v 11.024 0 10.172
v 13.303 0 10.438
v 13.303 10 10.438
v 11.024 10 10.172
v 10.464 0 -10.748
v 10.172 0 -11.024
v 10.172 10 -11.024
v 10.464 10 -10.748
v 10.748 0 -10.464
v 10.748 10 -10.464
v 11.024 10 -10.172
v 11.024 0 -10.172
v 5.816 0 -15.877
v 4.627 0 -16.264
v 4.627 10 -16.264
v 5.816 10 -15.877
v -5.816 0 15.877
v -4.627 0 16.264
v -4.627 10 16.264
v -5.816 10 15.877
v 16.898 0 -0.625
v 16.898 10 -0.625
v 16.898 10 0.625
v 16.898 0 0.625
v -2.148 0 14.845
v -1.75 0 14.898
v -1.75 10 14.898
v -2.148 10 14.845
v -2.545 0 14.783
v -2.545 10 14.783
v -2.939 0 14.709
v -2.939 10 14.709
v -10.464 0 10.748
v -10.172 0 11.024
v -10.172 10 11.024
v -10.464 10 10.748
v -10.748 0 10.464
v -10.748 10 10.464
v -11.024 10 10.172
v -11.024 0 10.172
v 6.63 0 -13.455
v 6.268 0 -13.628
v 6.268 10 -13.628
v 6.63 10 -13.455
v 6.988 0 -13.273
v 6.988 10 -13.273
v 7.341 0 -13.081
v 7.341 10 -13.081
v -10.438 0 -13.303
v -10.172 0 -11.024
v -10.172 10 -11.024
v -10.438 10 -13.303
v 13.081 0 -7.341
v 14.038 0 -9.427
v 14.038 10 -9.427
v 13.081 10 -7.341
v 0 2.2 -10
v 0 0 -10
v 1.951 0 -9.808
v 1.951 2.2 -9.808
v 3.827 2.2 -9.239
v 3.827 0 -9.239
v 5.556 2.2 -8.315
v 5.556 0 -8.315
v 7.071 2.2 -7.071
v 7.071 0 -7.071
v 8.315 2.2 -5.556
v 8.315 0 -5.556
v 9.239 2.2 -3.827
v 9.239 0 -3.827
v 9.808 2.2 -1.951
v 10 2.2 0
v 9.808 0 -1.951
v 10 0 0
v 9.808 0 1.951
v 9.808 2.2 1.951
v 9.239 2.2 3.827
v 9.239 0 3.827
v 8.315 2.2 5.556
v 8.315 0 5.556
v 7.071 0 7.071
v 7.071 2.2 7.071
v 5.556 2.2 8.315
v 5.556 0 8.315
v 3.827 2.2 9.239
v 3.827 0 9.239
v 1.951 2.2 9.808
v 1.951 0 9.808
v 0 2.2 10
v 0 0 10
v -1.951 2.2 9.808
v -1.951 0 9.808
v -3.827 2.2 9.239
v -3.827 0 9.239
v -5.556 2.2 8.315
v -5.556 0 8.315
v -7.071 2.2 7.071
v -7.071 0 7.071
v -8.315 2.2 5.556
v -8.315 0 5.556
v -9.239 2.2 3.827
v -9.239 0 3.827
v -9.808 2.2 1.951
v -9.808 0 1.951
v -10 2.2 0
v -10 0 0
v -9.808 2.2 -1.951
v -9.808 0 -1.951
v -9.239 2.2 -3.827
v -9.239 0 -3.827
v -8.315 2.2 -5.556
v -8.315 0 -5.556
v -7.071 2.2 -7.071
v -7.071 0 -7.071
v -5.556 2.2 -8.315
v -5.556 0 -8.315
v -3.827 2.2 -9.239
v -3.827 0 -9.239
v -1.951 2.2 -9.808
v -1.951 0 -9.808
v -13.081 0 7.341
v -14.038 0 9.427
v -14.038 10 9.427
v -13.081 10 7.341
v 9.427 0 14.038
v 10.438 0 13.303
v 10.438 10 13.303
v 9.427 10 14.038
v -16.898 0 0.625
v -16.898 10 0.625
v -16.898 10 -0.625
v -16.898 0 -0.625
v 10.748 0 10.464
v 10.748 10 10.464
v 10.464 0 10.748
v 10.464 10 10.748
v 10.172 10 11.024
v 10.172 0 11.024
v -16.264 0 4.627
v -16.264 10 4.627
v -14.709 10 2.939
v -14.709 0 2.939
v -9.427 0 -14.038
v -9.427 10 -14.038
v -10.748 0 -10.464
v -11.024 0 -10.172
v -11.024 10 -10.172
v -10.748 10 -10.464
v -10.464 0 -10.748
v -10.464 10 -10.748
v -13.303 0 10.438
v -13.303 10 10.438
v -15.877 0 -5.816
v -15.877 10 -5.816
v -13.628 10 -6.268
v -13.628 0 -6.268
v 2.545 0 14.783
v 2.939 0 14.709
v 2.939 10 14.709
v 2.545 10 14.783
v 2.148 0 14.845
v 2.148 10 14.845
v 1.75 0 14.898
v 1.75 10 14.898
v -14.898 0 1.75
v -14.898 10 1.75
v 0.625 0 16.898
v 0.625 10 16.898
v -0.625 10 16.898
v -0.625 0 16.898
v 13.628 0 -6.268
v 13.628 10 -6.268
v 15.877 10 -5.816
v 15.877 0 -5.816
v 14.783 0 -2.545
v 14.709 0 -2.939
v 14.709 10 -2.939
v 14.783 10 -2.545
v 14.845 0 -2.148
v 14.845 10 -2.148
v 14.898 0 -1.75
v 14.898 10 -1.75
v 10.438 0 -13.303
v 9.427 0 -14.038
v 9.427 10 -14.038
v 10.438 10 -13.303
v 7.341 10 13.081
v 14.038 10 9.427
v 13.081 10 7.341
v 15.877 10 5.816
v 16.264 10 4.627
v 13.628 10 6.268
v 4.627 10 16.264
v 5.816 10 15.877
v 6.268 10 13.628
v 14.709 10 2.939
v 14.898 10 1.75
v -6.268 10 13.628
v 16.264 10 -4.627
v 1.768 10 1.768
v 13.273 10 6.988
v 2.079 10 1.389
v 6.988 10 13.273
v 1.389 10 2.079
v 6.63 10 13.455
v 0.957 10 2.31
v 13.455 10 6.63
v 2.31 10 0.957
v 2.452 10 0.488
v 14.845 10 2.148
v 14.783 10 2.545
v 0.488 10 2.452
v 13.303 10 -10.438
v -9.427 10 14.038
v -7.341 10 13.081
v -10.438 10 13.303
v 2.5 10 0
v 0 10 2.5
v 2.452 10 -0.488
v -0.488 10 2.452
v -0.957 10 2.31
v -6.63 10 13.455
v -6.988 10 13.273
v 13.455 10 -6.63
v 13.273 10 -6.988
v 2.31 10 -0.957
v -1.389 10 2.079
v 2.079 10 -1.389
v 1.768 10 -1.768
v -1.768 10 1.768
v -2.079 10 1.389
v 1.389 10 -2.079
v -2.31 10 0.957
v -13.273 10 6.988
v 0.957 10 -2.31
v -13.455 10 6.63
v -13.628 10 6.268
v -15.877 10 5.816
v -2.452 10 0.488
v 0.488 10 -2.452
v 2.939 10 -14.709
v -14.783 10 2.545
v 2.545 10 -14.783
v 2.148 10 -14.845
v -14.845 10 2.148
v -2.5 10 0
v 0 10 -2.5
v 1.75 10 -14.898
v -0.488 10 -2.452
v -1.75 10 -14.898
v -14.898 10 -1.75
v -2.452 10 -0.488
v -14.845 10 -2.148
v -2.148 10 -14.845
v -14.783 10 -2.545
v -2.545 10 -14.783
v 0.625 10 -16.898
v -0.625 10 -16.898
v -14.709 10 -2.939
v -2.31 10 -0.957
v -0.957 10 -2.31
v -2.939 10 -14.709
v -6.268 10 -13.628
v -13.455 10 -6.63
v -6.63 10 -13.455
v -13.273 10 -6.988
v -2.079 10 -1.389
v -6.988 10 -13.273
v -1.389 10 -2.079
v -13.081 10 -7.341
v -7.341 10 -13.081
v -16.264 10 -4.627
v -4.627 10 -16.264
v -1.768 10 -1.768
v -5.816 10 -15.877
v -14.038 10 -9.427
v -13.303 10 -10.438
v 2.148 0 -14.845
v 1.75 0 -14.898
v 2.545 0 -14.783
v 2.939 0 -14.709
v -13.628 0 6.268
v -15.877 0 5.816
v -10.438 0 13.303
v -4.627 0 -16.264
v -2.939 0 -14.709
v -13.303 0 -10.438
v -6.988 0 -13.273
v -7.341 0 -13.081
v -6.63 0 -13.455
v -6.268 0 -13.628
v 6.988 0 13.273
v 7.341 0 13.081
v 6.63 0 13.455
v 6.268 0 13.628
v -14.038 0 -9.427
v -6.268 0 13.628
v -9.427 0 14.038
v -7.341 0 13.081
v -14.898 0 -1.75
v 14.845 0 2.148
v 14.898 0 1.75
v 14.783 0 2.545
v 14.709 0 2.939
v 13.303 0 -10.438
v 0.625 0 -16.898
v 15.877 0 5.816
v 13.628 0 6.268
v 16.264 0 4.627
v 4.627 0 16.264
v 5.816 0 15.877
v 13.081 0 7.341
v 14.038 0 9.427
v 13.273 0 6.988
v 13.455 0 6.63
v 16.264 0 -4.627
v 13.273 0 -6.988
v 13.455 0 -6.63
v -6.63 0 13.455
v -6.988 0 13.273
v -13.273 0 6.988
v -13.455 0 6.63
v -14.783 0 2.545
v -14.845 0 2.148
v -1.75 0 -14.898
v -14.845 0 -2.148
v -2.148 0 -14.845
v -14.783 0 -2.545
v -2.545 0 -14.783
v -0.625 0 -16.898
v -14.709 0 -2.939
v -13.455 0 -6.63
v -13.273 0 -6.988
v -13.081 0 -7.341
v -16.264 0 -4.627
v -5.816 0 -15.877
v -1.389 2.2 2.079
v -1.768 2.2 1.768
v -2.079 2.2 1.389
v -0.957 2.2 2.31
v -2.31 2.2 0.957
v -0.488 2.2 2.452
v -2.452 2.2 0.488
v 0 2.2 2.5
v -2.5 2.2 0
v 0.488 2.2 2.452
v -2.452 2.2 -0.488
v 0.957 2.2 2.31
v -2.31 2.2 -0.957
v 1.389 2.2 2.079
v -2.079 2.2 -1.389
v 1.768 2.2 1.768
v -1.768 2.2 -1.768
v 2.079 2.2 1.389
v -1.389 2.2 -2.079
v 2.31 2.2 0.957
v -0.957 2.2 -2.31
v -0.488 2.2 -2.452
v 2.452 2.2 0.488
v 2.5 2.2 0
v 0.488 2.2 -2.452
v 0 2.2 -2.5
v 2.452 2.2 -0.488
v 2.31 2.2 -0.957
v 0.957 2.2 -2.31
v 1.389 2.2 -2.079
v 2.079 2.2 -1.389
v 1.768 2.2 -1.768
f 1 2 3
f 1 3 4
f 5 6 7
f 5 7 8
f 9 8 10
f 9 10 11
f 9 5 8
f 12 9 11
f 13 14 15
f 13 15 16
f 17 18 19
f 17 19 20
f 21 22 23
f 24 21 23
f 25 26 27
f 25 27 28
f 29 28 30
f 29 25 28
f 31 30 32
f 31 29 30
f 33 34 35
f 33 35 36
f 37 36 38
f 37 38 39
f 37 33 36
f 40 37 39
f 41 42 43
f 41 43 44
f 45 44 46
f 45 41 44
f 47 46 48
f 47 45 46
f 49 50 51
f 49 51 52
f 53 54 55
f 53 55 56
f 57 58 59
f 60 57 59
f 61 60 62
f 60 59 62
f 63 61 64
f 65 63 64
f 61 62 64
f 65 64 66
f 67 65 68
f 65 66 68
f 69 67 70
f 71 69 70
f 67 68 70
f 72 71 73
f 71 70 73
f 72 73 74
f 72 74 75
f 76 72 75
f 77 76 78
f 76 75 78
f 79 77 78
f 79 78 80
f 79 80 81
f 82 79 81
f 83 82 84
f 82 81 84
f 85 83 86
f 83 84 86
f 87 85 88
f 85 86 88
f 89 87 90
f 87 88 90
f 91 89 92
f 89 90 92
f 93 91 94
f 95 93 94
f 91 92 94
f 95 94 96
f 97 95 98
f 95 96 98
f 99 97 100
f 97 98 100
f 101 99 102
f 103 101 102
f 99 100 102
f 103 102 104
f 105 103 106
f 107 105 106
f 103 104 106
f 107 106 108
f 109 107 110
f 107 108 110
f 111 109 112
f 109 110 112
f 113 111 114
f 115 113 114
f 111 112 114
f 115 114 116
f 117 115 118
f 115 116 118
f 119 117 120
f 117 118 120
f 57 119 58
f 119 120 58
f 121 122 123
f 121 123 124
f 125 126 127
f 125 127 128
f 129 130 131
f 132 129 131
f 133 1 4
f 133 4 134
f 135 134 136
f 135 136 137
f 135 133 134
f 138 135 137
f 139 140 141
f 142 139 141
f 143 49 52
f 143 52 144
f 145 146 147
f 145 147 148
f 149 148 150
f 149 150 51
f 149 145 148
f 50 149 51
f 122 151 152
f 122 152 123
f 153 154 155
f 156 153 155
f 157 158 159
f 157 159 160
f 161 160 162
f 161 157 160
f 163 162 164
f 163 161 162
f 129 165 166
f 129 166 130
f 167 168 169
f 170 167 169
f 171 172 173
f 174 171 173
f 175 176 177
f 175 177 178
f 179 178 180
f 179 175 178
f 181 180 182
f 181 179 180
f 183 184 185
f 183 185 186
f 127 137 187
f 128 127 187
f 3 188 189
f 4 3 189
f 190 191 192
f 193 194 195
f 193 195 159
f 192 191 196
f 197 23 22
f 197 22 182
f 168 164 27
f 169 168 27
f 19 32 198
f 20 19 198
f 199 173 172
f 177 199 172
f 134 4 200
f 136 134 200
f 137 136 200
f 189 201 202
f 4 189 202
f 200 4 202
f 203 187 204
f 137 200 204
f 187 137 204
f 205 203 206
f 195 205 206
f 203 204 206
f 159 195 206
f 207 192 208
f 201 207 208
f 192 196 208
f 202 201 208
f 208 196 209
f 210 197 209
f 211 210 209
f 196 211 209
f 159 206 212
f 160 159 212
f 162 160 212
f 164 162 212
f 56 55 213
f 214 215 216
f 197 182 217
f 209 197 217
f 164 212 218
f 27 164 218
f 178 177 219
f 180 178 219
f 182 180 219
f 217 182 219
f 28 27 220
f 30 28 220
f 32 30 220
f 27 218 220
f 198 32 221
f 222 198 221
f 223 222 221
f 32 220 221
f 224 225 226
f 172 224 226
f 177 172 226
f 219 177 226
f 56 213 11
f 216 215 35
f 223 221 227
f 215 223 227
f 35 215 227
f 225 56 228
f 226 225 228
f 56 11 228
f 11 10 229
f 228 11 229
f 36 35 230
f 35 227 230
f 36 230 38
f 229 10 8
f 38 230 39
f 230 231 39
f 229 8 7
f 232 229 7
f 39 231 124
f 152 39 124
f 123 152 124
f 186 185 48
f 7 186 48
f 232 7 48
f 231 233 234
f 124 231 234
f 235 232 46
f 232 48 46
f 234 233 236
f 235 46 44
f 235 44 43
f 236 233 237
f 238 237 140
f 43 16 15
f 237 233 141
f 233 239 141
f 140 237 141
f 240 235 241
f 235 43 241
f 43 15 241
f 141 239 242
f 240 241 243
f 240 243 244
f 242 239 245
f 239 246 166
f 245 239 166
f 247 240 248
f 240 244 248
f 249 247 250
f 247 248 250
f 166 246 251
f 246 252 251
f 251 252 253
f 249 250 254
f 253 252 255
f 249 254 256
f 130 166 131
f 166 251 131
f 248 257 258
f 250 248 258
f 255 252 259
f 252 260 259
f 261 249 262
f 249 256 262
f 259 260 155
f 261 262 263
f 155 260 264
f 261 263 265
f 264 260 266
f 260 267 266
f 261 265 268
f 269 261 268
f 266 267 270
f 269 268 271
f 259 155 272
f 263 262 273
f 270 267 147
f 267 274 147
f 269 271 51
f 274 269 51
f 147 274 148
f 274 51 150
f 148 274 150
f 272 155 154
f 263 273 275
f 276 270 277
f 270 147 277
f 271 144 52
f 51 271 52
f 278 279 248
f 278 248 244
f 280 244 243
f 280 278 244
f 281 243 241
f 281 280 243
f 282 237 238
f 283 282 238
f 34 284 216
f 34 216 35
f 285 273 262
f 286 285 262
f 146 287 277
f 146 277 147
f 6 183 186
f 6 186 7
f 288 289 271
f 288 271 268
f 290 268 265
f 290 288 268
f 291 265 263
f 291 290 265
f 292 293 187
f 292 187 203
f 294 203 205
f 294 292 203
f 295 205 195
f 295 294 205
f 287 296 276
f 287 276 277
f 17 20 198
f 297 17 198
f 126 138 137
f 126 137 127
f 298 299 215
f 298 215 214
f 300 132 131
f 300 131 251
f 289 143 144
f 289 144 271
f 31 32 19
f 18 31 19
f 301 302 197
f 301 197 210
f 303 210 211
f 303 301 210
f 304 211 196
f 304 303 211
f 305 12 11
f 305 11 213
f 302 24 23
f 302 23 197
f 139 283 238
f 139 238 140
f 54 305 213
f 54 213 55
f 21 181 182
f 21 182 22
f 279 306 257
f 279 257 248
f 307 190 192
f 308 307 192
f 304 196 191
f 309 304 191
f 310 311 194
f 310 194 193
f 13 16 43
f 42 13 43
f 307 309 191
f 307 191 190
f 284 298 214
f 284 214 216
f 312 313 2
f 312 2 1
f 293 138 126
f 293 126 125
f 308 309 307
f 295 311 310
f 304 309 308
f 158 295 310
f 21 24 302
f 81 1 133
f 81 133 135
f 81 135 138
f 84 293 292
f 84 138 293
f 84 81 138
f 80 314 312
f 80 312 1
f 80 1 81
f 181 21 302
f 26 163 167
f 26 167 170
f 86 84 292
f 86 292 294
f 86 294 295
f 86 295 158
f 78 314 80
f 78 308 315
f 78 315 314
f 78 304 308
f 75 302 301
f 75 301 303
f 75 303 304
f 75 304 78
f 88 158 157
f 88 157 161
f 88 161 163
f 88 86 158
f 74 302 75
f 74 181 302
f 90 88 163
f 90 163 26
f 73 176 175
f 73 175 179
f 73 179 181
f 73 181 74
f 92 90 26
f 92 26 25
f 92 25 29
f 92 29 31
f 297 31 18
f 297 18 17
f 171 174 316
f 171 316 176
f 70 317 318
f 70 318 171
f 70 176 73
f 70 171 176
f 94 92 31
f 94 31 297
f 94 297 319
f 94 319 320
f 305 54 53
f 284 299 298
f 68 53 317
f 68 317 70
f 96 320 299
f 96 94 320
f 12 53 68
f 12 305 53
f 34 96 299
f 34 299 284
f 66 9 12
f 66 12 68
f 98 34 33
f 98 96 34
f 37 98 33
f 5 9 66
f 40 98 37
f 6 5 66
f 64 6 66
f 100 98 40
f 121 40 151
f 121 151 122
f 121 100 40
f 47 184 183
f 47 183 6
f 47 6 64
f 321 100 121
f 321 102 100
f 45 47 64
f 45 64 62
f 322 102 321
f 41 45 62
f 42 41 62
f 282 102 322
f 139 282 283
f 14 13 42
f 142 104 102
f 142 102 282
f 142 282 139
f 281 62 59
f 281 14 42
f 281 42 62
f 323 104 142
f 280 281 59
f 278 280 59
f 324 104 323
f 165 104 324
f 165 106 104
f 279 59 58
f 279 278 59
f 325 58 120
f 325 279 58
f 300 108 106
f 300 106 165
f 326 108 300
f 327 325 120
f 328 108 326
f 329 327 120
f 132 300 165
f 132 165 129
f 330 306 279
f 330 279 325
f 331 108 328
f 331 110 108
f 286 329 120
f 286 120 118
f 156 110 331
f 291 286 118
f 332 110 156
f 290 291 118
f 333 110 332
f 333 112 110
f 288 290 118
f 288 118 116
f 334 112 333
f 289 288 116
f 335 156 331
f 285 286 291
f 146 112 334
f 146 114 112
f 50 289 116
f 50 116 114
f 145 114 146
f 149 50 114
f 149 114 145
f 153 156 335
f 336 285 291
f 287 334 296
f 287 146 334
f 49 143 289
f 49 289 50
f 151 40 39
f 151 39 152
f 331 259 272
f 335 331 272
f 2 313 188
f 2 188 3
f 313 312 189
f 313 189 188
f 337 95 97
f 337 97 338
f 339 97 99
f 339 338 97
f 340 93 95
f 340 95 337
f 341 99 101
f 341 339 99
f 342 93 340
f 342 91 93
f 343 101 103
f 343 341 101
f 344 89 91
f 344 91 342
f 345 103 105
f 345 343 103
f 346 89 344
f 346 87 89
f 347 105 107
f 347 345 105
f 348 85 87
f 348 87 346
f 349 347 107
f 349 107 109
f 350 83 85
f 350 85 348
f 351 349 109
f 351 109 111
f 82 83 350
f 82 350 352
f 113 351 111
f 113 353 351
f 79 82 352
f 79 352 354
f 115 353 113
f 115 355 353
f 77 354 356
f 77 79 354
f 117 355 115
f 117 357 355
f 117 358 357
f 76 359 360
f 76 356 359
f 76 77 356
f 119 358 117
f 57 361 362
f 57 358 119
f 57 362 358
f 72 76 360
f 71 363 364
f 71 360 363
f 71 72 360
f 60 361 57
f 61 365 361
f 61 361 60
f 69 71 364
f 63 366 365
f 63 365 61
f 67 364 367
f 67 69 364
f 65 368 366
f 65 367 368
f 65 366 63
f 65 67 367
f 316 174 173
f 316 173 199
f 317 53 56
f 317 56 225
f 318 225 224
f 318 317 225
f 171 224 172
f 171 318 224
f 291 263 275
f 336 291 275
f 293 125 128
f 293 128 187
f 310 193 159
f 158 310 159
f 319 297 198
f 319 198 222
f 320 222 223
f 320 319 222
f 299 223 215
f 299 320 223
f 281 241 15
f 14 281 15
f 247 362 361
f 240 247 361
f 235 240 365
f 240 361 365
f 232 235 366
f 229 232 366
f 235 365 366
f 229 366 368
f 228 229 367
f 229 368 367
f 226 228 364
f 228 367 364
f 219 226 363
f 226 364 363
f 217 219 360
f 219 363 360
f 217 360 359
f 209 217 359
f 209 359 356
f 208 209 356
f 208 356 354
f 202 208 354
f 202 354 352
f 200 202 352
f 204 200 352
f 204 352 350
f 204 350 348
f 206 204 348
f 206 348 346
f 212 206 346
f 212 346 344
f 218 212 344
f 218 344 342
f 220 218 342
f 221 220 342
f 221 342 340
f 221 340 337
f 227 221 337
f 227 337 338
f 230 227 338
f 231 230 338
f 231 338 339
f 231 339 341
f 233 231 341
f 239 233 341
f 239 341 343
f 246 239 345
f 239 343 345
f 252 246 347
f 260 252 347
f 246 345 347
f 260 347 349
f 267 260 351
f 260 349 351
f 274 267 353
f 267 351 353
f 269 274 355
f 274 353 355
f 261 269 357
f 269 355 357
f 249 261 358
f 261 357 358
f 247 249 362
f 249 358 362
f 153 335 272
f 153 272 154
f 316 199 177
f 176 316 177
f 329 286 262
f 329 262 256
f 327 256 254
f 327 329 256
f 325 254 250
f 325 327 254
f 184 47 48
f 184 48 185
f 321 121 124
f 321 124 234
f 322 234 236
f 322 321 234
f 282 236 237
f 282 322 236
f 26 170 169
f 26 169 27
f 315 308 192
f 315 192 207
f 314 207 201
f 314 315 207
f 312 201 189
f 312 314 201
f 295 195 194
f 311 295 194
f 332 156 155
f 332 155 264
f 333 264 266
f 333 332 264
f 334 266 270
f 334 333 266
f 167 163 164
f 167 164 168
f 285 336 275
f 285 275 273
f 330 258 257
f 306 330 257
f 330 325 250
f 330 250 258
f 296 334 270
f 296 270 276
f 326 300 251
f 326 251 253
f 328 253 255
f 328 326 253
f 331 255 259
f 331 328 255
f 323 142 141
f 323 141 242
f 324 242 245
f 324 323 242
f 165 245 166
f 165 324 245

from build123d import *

# Parameters (mm, degrees)
BOSS_EXTRUDE2_DEPTH = 10
SKETCH3_R           = 10
CUT_EXTRUDE1_DEPTH  = 2.2
SKETCH4_R           = 2.5
CUT_EXTRUDE2_DEPTH  = 26.137532403


with BuildPart() as part:
    # Sketch2 → Boss-Extrude2 (new body)
    with BuildSketch(Plane(origin=(0, 0, 0), x_dir=(1, 0, 0), z_dir=(0, 1, 0))):
        with BuildLine():
            Line((-0.625, 16.897566915), (0.625, 16.897566915))
            Line((0.625, 16.897566915), (1.75, 14.897566915))
            ThreePointArc((1.75, 14.897566915), (2.346516976, 14.815325109), (2.939252448, 14.709207832))
            Line((2.939252448, 14.709207832), (4.627225018, 16.263676746))
            Line((4.627225018, 16.263676746), (5.816045663, 15.877405503))
            Line((5.816045663, 15.877405503), (6.267950255, 13.627648352))
            ThreePointArc((6.267950255, 13.627648352), (6.809857496, 13.365097863), (7.340790388, 13.081009001))
            Line((7.340790388, 13.081009001), (9.426505011, 14.037784581))
            Line((9.426505011, 14.037784581), (10.437776254, 13.303053015))
            Line((10.437776254, 13.303053015), (10.172349868, 11.023760618))
            ThreePointArc((10.172349868, 11.023760618), (10.606601718, 10.606601718), (11.023760618, 10.172349868))
            Line((11.023760618, 10.172349868), (13.303053015, 10.437776254))
            Line((13.303053015, 10.437776254), (14.037784581, 9.426505011))
            Line((14.037784581, 9.426505011), (13.081009001, 7.340790388))
            ThreePointArc((13.081009001, 7.340790388), (13.365097863, 6.809857496), (13.627648352, 6.267950255))
            Line((13.627648352, 6.267950255), (15.877405503, 5.816045663))
            Line((15.877405503, 5.816045663), (16.263676746, 4.627225018))
            Line((16.263676746, 4.627225018), (14.709207832, 2.939252448))
            ThreePointArc((14.709207832, 2.939252448), (14.815325109, 2.346516976), (14.897566915, 1.75))
            Line((14.897566915, 1.75), (16.897566915, 0.625))
            Line((16.897566915, 0.625), (16.897566915, -0.625))
            Line((16.897566915, -0.625), (14.897566915, -1.75))
            ThreePointArc((14.897566915, -1.75), (14.815325109, -2.346516976), (14.709207832, -2.939252448))
            Line((14.709207832, -2.939252448), (16.263676746, -4.627225018))
            Line((16.263676746, -4.627225018), (15.877405503, -5.816045663))
            Line((15.877405503, -5.816045663), (13.627648352, -6.267950255))
            ThreePointArc((13.627648352, -6.267950255), (13.365097863, -6.809857496), (13.081009001, -7.340790388))
            Line((13.081009001, -7.340790388), (14.037784581, -9.426505011))
            Line((14.037784581, -9.426505011), (13.303053015, -10.437776254))
            Line((13.303053015, -10.437776254), (11.023760618, -10.172349868))
            ThreePointArc((11.023760618, -10.172349868), (10.606601718, -10.606601718), (10.172349868, -11.023760618))
            Line((10.172349868, -11.023760618), (10.437776254, -13.303053015))
            Line((10.437776254, -13.303053015), (9.426505011, -14.037784581))
            Line((9.426505011, -14.037784581), (7.340790388, -13.081009001))
            ThreePointArc((7.340790388, -13.081009001), (6.809857496, -13.365097863), (6.267950255, -13.627648352))
            Line((6.267950255, -13.627648352), (5.816045663, -15.877405503))
            Line((5.816045663, -15.877405503), (4.627225018, -16.263676746))
            Line((4.627225018, -16.263676746), (2.939252448, -14.709207832))
            ThreePointArc((2.939252448, -14.709207832), (2.346516976, -14.815325109), (1.75, -14.897566915))
            Line((1.75, -14.897566915), (0.625, -16.897566915))
            Line((0.625, -16.897566915), (-0.625, -16.897566915))
            Line((-0.625, -16.897566915), (-1.75, -14.897566915))
            ThreePointArc((-1.75, -14.897566915), (-2.346516976, -14.815325109), (-2.939252448, -14.709207832))
            Line((-2.939252448, -14.709207832), (-4.627225018, -16.263676746))
            Line((-4.627225018, -16.263676746), (-5.816045663, -15.877405503))
            Line((-5.816045663, -15.877405503), (-6.267950255, -13.627648352))
            ThreePointArc((-6.267950255, -13.627648352), (-6.809857496, -13.365097863), (-7.340790388, -13.081009001))
            Line((-7.340790388, -13.081009001), (-9.426505011, -14.037784581))
            Line((-9.426505011, -14.037784581), (-10.437776254, -13.303053015))
            Line((-10.437776254, -13.303053015), (-10.172349868, -11.023760618))
            ThreePointArc((-10.172349868, -11.023760618), (-10.606601718, -10.606601718), (-11.023760618, -10.172349868))
            Line((-11.023760618, -10.172349868), (-13.303053015, -10.437776254))
            Line((-13.303053015, -10.437776254), (-14.037784581, -9.426505011))
            Line((-14.037784581, -9.426505011), (-13.081009001, -7.340790388))
            ThreePointArc((-13.081009001, -7.340790388), (-13.365097863, -6.809857496), (-13.627648352, -6.267950255))
            Line((-13.627648352, -6.267950255), (-15.877405503, -5.816045663))
            Line((-15.877405503, -5.816045663), (-16.263676746, -4.627225018))
            Line((-16.263676746, -4.627225018), (-14.709207832, -2.939252448))
            ThreePointArc((-14.709207832, -2.939252448), (-14.815325109, -2.346516976), (-14.897566915, -1.75))
            Line((-14.897566915, -1.75), (-16.897566915, -0.625))
            Line((-16.897566915, -0.625), (-16.897566915, 0.625))
            Line((-16.897566915, 0.625), (-14.897566915, 1.75))
            ThreePointArc((-14.897566915, 1.75), (-14.815325109, 2.346516976), (-14.709207832, 2.939252448))
            Line((-14.709207832, 2.939252448), (-16.263676746, 4.627225018))
            Line((-16.263676746, 4.627225018), (-15.877405503, 5.816045663))
            Line((-15.877405503, 5.816045663), (-13.627648352, 6.267950255))
            ThreePointArc((-13.627648352, 6.267950255), (-13.365097863, 6.809857496), (-13.081009001, 7.340790388))
            Line((-13.081009001, 7.340790388), (-14.037784581, 9.426505011))
            Line((-14.037784581, 9.426505011), (-13.303053015, 10.437776254))
            Line((-13.303053015, 10.437776254), (-11.023760618, 10.172349868))
            ThreePointArc((-11.023760618, 10.172349868), (-10.606601718, 10.606601718), (-10.172349868, 11.023760618))
            Line((-10.172349868, 11.023760618), (-10.437776254, 13.303053015))
            Line((-10.437776254, 13.303053015), (-9.426505011, 14.037784581))
            Line((-9.426505011, 14.037784581), (-7.340790388, 13.081009001))
            ThreePointArc((-7.340790388, 13.081009001), (-6.809857496, 13.365097863), (-6.267950255, 13.627648352))
            Line((-6.267950255, 13.627648352), (-5.816045663, 15.877405503))
            Line((-5.816045663, 15.877405503), (-4.627225018, 16.263676746))
            Line((-4.627225018, 16.263676746), (-2.939252448, 14.709207832))
            ThreePointArc((-2.939252448, 14.709207832), (-2.346516976, 14.815325109), (-1.75, 14.897566915))
            Line((-1.75, 14.897566915), (-0.625, 16.897566915))
        make_face()
    extrude(amount=BOSS_EXTRUDE2_DEPTH)

    # Sketch3 → Cut-Extrude1 (cut)
    with BuildSketch(Plane.XZ):
        with Locations(Location((0, 0, 0), (0, 0, 270))):
            Circle(SKETCH3_R)
    extrude(amount=-CUT_EXTRUDE1_DEPTH, mode=Mode.SUBTRACT)

    # Sketch4 → Cut-Extrude2 (cut, through all)
    with BuildSketch(Plane.XZ.offset(-2.2)):
        with Locations(Location((0, 0, 0), (0, 0, 270))):
            Circle(SKETCH4_R)
    extrude(amount=-CUT_EXTRUDE2_DEPTH, mode=Mode.SUBTRACT)


solid = part.part
